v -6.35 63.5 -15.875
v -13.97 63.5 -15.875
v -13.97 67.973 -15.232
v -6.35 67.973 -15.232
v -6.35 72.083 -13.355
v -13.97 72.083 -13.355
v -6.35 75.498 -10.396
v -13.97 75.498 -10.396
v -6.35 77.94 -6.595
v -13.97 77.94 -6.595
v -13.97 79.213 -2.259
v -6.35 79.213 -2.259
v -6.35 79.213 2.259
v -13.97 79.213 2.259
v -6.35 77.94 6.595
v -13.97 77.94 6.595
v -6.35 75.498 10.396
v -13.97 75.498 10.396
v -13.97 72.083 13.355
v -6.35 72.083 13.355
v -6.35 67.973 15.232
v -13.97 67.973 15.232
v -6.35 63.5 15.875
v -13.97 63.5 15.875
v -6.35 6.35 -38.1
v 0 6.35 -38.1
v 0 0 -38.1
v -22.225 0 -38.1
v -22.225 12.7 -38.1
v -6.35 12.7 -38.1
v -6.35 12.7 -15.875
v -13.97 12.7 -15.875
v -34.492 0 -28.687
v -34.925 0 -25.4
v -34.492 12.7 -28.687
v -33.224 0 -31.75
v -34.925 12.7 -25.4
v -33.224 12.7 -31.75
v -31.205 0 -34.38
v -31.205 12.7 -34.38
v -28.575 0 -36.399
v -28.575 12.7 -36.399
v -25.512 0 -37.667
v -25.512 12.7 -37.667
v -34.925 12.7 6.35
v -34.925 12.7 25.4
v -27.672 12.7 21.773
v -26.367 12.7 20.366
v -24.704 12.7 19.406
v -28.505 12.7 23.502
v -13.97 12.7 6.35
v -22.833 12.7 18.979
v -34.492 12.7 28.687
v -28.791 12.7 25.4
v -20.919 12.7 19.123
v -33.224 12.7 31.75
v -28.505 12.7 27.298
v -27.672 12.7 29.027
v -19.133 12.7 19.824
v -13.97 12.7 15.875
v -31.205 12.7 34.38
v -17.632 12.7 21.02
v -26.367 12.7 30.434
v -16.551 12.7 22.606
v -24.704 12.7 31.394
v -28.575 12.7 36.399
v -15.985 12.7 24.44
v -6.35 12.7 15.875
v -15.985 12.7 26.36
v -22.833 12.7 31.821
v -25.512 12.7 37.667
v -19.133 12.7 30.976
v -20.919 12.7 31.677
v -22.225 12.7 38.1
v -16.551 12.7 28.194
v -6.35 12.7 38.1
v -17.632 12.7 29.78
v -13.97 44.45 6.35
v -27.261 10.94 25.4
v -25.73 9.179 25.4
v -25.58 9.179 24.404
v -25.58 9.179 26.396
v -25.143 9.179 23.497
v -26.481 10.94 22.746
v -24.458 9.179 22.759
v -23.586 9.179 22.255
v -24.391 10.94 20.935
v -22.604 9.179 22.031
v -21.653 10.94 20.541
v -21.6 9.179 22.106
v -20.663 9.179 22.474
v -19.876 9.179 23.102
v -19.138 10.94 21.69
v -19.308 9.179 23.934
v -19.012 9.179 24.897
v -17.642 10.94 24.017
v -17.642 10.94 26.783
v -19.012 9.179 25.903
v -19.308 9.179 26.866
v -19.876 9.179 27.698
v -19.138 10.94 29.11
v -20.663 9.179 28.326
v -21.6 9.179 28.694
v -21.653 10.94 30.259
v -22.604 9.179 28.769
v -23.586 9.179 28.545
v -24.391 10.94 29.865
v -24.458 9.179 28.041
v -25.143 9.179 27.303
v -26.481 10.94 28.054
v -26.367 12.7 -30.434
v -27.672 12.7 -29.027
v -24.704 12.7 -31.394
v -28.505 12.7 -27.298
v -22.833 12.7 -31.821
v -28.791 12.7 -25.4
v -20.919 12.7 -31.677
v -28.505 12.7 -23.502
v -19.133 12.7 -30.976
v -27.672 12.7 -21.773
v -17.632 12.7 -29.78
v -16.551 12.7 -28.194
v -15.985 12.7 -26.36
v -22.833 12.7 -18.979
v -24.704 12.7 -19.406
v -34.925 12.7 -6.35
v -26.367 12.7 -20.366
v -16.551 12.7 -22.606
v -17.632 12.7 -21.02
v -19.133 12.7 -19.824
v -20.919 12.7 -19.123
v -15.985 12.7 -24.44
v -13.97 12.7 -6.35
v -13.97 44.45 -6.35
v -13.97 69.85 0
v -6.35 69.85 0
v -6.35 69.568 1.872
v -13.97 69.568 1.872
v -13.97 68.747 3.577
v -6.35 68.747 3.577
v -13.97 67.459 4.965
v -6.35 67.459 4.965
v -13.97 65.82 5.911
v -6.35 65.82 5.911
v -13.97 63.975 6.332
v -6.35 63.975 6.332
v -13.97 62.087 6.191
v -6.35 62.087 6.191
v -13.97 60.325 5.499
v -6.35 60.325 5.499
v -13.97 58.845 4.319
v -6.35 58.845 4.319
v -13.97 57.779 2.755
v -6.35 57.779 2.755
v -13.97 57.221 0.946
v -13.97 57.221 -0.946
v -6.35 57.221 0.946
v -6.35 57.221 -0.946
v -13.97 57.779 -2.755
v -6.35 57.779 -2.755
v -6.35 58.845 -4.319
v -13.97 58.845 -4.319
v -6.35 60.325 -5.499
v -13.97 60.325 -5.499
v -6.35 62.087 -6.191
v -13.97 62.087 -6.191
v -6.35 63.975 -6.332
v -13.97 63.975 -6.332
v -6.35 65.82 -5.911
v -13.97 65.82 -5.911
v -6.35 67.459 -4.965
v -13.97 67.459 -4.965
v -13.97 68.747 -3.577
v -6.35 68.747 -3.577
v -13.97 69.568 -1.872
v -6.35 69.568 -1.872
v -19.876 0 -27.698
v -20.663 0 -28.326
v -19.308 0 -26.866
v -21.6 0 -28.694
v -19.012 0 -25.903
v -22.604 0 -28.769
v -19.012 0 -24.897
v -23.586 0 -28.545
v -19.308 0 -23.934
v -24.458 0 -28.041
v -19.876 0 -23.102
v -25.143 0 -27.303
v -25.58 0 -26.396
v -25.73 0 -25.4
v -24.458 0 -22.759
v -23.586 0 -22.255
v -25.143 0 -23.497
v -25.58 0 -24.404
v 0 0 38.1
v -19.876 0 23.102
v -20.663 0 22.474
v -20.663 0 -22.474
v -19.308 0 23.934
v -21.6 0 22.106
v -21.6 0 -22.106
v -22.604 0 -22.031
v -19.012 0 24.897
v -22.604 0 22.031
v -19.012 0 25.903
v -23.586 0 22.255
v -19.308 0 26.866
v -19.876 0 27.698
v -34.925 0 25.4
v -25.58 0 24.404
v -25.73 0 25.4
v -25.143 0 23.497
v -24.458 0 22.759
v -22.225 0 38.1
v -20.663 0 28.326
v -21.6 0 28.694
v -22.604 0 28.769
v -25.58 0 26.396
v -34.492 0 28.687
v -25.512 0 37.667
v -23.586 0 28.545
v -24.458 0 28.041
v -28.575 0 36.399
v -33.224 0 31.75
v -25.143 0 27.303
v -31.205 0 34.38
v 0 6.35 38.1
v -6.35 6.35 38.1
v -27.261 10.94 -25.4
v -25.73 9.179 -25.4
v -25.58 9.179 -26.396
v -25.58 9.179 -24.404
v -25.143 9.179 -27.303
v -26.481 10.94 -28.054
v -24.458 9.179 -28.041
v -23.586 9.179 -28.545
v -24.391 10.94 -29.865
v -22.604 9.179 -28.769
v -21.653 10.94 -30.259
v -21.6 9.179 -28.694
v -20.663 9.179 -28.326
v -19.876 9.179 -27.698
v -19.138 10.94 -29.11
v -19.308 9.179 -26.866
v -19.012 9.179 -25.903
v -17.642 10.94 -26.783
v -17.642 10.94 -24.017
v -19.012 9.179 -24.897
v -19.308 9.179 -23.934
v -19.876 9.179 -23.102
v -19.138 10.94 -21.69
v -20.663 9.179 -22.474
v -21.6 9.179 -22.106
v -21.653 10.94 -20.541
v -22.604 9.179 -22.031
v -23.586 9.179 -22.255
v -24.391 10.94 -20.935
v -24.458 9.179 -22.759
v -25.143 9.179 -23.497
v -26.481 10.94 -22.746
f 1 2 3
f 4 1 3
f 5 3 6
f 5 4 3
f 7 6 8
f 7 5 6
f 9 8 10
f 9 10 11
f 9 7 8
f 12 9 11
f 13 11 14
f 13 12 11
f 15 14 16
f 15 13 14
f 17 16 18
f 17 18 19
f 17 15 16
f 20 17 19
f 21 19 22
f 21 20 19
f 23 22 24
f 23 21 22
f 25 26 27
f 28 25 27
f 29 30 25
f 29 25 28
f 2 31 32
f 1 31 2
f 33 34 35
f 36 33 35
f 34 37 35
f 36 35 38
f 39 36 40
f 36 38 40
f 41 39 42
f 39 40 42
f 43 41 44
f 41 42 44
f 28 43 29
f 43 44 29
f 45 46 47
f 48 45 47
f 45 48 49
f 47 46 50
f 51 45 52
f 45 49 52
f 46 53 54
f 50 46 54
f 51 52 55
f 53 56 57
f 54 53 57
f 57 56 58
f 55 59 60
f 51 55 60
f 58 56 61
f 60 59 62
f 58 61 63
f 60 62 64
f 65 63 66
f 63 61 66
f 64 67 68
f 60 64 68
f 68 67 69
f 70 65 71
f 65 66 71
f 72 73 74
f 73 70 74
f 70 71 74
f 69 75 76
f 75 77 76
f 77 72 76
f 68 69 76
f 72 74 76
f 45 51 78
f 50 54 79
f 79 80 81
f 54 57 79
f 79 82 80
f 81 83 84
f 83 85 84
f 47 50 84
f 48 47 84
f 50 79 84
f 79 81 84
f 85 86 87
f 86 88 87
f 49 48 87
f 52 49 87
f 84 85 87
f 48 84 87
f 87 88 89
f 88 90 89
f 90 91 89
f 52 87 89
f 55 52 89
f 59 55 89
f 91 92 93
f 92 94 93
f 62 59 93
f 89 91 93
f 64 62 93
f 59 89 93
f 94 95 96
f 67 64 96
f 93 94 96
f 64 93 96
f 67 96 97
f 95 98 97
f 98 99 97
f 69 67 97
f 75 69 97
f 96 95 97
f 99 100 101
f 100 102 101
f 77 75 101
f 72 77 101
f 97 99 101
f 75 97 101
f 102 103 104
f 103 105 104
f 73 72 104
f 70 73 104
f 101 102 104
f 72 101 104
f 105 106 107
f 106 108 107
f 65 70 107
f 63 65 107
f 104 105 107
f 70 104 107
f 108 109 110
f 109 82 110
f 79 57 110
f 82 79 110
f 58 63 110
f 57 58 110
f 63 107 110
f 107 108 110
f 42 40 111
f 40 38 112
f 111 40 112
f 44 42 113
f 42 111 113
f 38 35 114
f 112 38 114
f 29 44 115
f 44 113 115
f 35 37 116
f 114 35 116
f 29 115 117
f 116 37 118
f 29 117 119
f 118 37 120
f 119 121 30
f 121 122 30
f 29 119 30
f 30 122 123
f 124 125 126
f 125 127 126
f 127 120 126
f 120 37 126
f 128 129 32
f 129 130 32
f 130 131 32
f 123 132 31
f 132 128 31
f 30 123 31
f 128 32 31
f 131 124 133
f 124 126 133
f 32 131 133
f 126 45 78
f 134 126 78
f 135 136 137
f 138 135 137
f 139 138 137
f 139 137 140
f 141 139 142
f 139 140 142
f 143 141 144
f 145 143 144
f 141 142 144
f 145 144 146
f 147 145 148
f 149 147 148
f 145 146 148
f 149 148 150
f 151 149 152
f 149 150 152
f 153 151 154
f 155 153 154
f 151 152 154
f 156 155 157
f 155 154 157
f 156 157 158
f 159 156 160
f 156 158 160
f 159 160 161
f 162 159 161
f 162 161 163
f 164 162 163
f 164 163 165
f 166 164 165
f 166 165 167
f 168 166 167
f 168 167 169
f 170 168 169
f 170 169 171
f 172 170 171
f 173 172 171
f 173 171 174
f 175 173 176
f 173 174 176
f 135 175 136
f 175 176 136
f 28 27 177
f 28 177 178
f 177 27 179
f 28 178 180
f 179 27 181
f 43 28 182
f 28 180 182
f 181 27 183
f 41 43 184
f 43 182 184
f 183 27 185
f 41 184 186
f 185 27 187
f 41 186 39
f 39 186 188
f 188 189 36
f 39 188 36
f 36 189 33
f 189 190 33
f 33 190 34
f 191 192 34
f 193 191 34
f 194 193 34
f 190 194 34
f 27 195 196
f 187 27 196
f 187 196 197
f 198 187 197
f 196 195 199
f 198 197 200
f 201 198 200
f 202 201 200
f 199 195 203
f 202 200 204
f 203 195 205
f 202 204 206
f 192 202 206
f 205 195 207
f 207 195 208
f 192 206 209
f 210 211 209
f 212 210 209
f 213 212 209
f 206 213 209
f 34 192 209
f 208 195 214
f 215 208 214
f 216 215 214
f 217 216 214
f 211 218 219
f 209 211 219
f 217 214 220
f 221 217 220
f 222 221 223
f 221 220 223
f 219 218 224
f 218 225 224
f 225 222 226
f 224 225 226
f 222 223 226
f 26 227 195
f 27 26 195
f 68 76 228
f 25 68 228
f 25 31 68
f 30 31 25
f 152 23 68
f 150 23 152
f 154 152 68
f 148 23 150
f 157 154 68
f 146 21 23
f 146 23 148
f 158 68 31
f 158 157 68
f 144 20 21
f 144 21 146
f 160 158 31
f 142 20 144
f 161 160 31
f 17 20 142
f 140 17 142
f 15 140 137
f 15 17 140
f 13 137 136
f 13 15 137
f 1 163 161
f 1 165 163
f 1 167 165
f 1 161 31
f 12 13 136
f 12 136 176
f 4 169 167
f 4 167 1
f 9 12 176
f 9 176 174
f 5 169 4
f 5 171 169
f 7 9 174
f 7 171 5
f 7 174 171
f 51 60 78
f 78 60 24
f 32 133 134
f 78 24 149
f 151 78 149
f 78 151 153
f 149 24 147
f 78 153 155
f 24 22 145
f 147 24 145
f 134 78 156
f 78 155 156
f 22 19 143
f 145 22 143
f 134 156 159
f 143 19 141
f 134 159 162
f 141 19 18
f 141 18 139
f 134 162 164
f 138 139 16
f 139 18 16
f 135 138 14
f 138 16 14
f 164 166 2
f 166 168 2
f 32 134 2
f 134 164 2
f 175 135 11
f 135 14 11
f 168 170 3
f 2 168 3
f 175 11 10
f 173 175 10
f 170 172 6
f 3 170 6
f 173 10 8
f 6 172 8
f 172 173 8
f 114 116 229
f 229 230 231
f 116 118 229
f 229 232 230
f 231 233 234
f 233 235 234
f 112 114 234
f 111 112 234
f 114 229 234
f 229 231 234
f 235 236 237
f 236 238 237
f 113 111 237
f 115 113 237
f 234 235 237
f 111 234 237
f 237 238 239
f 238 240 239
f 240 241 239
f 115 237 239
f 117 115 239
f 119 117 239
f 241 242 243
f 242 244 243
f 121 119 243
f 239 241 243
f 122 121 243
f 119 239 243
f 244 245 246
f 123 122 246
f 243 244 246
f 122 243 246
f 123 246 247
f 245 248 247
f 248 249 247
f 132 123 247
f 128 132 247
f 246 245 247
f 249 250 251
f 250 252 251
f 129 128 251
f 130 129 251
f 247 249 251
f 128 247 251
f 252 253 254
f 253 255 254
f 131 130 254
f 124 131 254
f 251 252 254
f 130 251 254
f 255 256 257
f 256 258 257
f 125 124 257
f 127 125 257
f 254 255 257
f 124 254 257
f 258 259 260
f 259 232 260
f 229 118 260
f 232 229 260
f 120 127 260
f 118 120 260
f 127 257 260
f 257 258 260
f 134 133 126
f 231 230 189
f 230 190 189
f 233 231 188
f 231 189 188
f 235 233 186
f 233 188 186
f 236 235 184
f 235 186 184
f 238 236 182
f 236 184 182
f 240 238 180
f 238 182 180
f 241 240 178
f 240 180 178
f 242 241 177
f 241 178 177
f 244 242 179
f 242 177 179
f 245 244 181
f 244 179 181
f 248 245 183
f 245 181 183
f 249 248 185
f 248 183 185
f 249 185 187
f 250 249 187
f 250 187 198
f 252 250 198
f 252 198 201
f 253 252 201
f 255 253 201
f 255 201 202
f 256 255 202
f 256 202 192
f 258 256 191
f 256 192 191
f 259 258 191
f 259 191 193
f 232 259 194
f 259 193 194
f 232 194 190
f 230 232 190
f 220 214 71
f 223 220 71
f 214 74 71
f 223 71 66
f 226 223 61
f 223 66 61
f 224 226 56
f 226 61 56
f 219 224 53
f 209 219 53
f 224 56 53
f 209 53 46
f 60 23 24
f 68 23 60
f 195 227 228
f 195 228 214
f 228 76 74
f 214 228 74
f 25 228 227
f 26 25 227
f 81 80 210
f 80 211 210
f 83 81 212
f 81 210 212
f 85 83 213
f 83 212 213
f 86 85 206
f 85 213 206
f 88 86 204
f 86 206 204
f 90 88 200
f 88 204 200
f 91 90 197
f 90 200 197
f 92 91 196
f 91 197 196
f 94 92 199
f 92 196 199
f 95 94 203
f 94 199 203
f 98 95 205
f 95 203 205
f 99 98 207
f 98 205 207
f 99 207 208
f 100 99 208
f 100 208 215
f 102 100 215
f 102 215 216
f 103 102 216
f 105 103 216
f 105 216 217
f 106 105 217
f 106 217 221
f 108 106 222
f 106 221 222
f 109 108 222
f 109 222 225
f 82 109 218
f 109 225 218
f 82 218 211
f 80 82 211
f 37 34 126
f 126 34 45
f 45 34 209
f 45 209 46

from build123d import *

# Parameters (mm, degrees)
BOSS_EXTRUDE1_DEPTH                              = 38.1
SKETCH2_R                                        = 15.875
SKETCH2_R_2                                      = 6.35
BOSS_EXTRUDE2_DEPTH                              = 7.62
BOSS_EXTRUDE3_DEPTH                              = 6.35
FILLET1_R                                        = 12.7
CSK_FOR_1_4_FLAT_HEAD_MACHINE_SCREW1_D           = 6.7564
CSK_FOR_1_4_FLAT_HEAD_MACHINE_SCREW1_CSINK_D     = 12.8778
CSK_FOR_1_4_FLAT_HEAD_MACHINE_SCREW1_CSINK_ANGLE = 82


with BuildPart() as part:
    # Sketch1 → Boss-Extrude1 (new, symmetric)
    with BuildSketch(Plane.XY):
        Polygon((0, 0), (-34.925, 0), (-34.925, 12.7), (-6.35, 12.7), (-6.35, 6.35), (0, 6.35), align=None)
    extrude(amount=BOSS_EXTRUDE1_DEPTH, both=True)

    # Sketch2 → Boss-Extrude2 (add)
    # profile 1 of 2: a face of its own
    with BuildSketch(Plane(origin=(-6.35, 0, 0), x_dir=(0, 0, -1), z_dir=(1, 0, 0))):
        with BuildLine():
            ThreePointArc((15.875, 63.5), (0, 47.625), (-15.875, 63.5))
            Line((-15.875, 63.5), (-15.875, 12.7))
            Line((-15.875, 12.7), (15.875, 12.7))
            Line((15.875, 12.7), (15.875, 63.5))
        make_face()
    # profile 2 of 2: a face of its own
    with BuildSketch(Plane(origin=(-6.35, 0, 0), x_dir=(0, 0, -1), z_dir=(1, 0, 0))):
        with Locations((0, 63.5)):
            Circle(SKETCH2_R)
        with Locations(Location((0, 63.5, 0), (0, 0, 90))):
            Circle(SKETCH2_R_2, mode=Mode.SUBTRACT)
    extrude(amount=-BOSS_EXTRUDE2_DEPTH)

    # Sketch7 → Boss-Extrude3 (add, symmetric)
    with BuildSketch(Plane.XY):
        Polygon((-13.97, 44.45), (-13.97, 12.7), (-34.925, 12.7), align=None)
    extrude(amount=BOSS_EXTRUDE3_DEPTH, both=True)

    # Fillet1
    fillet1_edges = [part.edges().sort_by_distance(p)[0] for p in [
        (-34.925, 6.35, 38.1),
        (-34.925, 6.35, -38.1),
    ]]
    fillet(fillet1_edges, radius=FILLET1_R)

    # CSK for 1/4 Flat Head Machine Screw1 (through all)
    with Locations(Plane(origin=(0, 12.7, 0), x_dir=(1, 0, 0), z_dir=(0, 1, 0))):
        with Locations((-22.352, 25.4), (-22.352, -25.4)):
            CounterSinkHole(CSK_FOR_1_4_FLAT_HEAD_MACHINE_SCREW1_D / 2, CSK_FOR_1_4_FLAT_HEAD_MACHINE_SCREW1_CSINK_D / 2, counter_sink_angle=CSK_FOR_1_4_FLAT_HEAD_MACHINE_SCREW1_CSINK_ANGLE)


solid = part.part
